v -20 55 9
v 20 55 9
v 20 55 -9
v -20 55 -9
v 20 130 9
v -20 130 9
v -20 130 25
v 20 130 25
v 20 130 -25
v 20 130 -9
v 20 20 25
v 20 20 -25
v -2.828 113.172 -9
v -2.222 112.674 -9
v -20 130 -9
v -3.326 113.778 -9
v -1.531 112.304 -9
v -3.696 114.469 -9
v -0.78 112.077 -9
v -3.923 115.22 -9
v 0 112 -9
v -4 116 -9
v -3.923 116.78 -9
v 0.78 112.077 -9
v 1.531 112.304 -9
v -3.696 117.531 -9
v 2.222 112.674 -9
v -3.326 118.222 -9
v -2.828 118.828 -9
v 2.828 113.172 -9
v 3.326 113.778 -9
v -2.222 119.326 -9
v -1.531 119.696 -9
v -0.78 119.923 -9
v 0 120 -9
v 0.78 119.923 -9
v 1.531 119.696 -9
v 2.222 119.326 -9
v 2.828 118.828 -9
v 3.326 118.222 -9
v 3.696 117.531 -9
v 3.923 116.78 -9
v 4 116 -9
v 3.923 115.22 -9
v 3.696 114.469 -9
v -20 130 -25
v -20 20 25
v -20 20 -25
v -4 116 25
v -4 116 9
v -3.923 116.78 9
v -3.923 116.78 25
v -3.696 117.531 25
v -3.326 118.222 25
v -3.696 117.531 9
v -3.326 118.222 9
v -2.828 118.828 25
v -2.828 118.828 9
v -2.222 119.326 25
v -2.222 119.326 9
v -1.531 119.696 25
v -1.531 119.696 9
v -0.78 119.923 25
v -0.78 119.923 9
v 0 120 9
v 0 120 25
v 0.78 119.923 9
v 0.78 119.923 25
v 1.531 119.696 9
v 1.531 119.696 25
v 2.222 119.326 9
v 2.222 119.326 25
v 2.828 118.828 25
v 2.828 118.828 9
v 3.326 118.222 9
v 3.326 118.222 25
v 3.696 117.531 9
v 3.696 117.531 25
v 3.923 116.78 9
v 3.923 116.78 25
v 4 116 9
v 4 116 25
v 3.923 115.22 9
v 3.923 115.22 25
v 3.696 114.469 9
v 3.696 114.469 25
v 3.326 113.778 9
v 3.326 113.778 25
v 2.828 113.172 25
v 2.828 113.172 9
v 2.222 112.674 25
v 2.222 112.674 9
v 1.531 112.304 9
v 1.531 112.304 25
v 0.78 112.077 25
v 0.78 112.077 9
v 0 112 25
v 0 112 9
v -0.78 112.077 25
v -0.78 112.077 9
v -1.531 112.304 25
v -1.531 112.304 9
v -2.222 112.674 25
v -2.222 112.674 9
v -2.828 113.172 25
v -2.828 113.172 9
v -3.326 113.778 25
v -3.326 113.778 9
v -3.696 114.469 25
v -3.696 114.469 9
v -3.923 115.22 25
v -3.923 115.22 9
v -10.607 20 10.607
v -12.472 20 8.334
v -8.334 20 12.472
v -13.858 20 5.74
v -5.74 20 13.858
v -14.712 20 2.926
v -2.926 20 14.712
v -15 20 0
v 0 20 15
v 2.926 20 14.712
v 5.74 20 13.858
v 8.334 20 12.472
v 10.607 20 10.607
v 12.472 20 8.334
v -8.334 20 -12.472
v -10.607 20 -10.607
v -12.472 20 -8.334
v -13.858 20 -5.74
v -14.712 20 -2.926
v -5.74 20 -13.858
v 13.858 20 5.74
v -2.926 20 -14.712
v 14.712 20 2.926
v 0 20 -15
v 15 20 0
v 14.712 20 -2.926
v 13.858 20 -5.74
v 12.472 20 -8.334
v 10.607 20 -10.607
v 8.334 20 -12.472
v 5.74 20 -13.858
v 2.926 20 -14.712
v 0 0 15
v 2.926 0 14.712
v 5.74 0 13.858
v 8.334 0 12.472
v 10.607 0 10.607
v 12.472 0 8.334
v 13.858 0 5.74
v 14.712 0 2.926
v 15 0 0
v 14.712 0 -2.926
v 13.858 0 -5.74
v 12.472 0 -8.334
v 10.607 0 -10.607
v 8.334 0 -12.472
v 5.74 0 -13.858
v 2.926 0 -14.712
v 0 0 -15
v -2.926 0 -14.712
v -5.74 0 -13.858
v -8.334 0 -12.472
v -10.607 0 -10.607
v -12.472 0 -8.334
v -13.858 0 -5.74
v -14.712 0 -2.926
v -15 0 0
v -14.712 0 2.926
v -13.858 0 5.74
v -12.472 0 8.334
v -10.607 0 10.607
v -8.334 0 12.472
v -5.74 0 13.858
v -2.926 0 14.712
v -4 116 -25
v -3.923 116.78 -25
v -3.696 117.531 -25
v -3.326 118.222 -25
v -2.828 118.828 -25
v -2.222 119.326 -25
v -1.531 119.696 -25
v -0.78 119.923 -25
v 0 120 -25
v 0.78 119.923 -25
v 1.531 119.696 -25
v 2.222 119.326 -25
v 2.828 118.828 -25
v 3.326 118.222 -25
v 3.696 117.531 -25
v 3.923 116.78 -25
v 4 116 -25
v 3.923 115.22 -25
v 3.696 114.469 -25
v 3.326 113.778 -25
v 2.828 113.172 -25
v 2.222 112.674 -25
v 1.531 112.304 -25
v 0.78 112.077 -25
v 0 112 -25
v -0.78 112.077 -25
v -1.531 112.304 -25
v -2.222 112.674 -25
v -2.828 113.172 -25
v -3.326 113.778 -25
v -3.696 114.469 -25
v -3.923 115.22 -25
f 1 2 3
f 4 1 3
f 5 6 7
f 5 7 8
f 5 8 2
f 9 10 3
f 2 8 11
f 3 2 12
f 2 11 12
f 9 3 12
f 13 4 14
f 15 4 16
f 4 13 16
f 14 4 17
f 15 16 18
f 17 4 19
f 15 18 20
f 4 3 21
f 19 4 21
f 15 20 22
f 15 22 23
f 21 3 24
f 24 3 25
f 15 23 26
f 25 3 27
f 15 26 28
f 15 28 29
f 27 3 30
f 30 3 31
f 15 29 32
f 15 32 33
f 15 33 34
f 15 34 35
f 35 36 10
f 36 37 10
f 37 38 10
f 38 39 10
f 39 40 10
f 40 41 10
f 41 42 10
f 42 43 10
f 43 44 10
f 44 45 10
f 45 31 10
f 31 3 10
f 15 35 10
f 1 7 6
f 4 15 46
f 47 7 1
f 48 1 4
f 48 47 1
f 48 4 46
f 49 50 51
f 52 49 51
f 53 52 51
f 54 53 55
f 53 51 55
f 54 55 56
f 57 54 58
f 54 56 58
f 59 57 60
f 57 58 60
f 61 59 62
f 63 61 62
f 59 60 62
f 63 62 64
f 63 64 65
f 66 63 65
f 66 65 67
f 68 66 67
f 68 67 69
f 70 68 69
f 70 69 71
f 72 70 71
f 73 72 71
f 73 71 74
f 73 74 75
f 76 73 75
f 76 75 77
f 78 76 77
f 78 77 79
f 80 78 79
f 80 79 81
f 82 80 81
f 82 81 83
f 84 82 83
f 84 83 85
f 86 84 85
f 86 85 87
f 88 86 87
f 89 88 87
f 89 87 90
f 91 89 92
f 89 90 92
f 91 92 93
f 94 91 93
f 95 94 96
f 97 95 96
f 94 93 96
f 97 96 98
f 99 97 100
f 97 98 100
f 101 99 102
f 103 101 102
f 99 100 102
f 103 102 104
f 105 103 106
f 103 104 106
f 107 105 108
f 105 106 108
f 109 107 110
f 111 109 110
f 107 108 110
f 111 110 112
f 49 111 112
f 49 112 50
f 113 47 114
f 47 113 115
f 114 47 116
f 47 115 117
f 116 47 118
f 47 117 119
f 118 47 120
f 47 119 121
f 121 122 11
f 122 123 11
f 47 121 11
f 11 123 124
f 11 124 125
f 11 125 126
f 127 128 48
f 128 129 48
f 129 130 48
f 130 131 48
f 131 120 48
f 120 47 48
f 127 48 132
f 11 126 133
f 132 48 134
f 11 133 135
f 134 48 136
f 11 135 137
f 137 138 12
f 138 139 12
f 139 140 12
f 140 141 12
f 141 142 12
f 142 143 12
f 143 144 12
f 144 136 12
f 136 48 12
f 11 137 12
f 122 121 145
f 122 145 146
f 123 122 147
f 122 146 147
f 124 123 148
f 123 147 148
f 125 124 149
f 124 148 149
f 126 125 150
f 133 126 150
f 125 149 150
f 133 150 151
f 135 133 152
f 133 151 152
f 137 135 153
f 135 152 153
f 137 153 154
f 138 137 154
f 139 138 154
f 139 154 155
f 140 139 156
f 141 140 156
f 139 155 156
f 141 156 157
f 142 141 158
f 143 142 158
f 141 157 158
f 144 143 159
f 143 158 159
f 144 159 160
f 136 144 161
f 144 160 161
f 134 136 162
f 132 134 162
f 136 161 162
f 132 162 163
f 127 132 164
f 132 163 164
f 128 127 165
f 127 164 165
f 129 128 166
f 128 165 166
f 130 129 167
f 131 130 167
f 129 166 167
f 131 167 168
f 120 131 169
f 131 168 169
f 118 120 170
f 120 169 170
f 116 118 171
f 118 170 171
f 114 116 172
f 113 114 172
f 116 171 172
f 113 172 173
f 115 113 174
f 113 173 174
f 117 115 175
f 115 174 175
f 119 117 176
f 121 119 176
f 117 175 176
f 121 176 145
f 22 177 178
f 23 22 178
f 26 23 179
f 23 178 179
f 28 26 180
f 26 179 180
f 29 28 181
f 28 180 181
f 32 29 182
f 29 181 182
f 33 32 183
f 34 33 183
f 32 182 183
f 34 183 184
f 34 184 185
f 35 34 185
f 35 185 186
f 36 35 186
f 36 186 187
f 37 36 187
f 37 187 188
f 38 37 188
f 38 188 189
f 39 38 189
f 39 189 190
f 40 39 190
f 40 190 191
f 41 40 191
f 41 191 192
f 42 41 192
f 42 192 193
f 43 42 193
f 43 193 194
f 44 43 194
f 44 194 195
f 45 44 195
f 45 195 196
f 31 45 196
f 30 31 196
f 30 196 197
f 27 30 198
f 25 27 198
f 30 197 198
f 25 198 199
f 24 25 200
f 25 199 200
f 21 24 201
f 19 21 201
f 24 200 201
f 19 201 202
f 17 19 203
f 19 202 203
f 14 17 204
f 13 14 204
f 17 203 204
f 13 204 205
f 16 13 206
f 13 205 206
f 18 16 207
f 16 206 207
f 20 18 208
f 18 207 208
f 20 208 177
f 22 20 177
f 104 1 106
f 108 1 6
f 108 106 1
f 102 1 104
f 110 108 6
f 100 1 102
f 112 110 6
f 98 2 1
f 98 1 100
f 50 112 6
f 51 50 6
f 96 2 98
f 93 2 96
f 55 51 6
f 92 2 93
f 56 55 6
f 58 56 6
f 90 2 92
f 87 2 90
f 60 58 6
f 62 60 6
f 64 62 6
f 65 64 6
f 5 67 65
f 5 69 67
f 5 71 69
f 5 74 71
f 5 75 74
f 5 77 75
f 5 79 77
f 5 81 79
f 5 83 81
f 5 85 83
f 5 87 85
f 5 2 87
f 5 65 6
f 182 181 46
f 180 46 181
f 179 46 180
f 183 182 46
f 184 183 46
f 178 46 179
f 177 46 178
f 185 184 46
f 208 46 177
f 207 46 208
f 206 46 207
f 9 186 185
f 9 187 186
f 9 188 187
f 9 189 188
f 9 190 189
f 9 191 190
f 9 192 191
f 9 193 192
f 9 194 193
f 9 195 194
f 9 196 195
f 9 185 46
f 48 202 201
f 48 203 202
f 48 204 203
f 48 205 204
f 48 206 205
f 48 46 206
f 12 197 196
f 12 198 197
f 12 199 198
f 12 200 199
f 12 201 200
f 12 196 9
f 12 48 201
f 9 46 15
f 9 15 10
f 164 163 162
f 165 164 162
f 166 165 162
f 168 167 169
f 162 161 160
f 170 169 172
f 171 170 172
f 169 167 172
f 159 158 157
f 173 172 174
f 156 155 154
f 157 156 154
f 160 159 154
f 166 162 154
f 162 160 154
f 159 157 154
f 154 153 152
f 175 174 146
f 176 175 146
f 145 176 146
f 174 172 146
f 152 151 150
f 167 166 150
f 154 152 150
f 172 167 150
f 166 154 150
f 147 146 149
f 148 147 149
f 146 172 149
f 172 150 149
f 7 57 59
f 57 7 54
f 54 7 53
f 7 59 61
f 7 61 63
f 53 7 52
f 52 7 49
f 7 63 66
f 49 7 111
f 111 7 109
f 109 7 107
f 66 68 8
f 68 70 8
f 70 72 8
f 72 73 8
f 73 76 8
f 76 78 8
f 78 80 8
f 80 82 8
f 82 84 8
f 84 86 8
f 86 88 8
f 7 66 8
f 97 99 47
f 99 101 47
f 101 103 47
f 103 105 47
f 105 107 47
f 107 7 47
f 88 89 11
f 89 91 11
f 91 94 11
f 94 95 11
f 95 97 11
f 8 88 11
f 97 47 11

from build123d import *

# Parameters (mm, degrees)
SKETCH1_R           = 15
BOSS_EXTRUDE1_DEPTH = 20
SKETCH2_W           = 40
SKETCH2_H           = 50
BOSS_EXTRUDE2_DEPTH = 110
SKETCH3_W           = 18
SKETCH3_H           = 150
CUT_EXTRUDE1_DEPTH  = 139.293166859
SKETCH4_R           = 4
CUT_EXTRUDE2_DEPTH  = 141.712472795


with BuildPart() as part:
    # Sketch1 → Boss-Extrude1 (new body)
    with BuildSketch(Plane(origin=(0, 0, 0), x_dir=(1, 0, 0), z_dir=(0, 1, 0))):
        with Locations(Location((0, 0, 0), (0, 0, 270))):
            Circle(SKETCH1_R)
    extrude(amount=BOSS_EXTRUDE1_DEPTH)

    # Sketch2 → Boss-Extrude2 (add)
    with BuildSketch(Plane(origin=(0, 20, 0), x_dir=(1, 0, 0), z_dir=(0, 1, 0))):
        Rectangle(SKETCH2_W, SKETCH2_H)
    extrude(amount=BOSS_EXTRUDE2_DEPTH)

    # Sketch3 → Cut-Extrude1 (cut, through all)
    with BuildSketch(Plane(origin=(20, 0, 0), x_dir=(0, 0, -1), z_dir=(1, 0, 0))):
        with Locations((0, 130)):
            Rectangle(SKETCH3_W, SKETCH3_H)
    extrude(amount=-CUT_EXTRUDE1_DEPTH, mode=Mode.SUBTRACT)

    # Sketch4 → Cut-Extrude2 (cut, through all)
    with BuildSketch(Plane(origin=(0, 0, -25), x_dir=(-1, 0, 0), z_dir=(0, 0, -1))):
        with Locations((0, 116)):
            Circle(SKETCH4_R)
    extrude(amount=-CUT_EXTRUDE2_DEPTH, mode=Mode.SUBTRACT)


solid = part.part
